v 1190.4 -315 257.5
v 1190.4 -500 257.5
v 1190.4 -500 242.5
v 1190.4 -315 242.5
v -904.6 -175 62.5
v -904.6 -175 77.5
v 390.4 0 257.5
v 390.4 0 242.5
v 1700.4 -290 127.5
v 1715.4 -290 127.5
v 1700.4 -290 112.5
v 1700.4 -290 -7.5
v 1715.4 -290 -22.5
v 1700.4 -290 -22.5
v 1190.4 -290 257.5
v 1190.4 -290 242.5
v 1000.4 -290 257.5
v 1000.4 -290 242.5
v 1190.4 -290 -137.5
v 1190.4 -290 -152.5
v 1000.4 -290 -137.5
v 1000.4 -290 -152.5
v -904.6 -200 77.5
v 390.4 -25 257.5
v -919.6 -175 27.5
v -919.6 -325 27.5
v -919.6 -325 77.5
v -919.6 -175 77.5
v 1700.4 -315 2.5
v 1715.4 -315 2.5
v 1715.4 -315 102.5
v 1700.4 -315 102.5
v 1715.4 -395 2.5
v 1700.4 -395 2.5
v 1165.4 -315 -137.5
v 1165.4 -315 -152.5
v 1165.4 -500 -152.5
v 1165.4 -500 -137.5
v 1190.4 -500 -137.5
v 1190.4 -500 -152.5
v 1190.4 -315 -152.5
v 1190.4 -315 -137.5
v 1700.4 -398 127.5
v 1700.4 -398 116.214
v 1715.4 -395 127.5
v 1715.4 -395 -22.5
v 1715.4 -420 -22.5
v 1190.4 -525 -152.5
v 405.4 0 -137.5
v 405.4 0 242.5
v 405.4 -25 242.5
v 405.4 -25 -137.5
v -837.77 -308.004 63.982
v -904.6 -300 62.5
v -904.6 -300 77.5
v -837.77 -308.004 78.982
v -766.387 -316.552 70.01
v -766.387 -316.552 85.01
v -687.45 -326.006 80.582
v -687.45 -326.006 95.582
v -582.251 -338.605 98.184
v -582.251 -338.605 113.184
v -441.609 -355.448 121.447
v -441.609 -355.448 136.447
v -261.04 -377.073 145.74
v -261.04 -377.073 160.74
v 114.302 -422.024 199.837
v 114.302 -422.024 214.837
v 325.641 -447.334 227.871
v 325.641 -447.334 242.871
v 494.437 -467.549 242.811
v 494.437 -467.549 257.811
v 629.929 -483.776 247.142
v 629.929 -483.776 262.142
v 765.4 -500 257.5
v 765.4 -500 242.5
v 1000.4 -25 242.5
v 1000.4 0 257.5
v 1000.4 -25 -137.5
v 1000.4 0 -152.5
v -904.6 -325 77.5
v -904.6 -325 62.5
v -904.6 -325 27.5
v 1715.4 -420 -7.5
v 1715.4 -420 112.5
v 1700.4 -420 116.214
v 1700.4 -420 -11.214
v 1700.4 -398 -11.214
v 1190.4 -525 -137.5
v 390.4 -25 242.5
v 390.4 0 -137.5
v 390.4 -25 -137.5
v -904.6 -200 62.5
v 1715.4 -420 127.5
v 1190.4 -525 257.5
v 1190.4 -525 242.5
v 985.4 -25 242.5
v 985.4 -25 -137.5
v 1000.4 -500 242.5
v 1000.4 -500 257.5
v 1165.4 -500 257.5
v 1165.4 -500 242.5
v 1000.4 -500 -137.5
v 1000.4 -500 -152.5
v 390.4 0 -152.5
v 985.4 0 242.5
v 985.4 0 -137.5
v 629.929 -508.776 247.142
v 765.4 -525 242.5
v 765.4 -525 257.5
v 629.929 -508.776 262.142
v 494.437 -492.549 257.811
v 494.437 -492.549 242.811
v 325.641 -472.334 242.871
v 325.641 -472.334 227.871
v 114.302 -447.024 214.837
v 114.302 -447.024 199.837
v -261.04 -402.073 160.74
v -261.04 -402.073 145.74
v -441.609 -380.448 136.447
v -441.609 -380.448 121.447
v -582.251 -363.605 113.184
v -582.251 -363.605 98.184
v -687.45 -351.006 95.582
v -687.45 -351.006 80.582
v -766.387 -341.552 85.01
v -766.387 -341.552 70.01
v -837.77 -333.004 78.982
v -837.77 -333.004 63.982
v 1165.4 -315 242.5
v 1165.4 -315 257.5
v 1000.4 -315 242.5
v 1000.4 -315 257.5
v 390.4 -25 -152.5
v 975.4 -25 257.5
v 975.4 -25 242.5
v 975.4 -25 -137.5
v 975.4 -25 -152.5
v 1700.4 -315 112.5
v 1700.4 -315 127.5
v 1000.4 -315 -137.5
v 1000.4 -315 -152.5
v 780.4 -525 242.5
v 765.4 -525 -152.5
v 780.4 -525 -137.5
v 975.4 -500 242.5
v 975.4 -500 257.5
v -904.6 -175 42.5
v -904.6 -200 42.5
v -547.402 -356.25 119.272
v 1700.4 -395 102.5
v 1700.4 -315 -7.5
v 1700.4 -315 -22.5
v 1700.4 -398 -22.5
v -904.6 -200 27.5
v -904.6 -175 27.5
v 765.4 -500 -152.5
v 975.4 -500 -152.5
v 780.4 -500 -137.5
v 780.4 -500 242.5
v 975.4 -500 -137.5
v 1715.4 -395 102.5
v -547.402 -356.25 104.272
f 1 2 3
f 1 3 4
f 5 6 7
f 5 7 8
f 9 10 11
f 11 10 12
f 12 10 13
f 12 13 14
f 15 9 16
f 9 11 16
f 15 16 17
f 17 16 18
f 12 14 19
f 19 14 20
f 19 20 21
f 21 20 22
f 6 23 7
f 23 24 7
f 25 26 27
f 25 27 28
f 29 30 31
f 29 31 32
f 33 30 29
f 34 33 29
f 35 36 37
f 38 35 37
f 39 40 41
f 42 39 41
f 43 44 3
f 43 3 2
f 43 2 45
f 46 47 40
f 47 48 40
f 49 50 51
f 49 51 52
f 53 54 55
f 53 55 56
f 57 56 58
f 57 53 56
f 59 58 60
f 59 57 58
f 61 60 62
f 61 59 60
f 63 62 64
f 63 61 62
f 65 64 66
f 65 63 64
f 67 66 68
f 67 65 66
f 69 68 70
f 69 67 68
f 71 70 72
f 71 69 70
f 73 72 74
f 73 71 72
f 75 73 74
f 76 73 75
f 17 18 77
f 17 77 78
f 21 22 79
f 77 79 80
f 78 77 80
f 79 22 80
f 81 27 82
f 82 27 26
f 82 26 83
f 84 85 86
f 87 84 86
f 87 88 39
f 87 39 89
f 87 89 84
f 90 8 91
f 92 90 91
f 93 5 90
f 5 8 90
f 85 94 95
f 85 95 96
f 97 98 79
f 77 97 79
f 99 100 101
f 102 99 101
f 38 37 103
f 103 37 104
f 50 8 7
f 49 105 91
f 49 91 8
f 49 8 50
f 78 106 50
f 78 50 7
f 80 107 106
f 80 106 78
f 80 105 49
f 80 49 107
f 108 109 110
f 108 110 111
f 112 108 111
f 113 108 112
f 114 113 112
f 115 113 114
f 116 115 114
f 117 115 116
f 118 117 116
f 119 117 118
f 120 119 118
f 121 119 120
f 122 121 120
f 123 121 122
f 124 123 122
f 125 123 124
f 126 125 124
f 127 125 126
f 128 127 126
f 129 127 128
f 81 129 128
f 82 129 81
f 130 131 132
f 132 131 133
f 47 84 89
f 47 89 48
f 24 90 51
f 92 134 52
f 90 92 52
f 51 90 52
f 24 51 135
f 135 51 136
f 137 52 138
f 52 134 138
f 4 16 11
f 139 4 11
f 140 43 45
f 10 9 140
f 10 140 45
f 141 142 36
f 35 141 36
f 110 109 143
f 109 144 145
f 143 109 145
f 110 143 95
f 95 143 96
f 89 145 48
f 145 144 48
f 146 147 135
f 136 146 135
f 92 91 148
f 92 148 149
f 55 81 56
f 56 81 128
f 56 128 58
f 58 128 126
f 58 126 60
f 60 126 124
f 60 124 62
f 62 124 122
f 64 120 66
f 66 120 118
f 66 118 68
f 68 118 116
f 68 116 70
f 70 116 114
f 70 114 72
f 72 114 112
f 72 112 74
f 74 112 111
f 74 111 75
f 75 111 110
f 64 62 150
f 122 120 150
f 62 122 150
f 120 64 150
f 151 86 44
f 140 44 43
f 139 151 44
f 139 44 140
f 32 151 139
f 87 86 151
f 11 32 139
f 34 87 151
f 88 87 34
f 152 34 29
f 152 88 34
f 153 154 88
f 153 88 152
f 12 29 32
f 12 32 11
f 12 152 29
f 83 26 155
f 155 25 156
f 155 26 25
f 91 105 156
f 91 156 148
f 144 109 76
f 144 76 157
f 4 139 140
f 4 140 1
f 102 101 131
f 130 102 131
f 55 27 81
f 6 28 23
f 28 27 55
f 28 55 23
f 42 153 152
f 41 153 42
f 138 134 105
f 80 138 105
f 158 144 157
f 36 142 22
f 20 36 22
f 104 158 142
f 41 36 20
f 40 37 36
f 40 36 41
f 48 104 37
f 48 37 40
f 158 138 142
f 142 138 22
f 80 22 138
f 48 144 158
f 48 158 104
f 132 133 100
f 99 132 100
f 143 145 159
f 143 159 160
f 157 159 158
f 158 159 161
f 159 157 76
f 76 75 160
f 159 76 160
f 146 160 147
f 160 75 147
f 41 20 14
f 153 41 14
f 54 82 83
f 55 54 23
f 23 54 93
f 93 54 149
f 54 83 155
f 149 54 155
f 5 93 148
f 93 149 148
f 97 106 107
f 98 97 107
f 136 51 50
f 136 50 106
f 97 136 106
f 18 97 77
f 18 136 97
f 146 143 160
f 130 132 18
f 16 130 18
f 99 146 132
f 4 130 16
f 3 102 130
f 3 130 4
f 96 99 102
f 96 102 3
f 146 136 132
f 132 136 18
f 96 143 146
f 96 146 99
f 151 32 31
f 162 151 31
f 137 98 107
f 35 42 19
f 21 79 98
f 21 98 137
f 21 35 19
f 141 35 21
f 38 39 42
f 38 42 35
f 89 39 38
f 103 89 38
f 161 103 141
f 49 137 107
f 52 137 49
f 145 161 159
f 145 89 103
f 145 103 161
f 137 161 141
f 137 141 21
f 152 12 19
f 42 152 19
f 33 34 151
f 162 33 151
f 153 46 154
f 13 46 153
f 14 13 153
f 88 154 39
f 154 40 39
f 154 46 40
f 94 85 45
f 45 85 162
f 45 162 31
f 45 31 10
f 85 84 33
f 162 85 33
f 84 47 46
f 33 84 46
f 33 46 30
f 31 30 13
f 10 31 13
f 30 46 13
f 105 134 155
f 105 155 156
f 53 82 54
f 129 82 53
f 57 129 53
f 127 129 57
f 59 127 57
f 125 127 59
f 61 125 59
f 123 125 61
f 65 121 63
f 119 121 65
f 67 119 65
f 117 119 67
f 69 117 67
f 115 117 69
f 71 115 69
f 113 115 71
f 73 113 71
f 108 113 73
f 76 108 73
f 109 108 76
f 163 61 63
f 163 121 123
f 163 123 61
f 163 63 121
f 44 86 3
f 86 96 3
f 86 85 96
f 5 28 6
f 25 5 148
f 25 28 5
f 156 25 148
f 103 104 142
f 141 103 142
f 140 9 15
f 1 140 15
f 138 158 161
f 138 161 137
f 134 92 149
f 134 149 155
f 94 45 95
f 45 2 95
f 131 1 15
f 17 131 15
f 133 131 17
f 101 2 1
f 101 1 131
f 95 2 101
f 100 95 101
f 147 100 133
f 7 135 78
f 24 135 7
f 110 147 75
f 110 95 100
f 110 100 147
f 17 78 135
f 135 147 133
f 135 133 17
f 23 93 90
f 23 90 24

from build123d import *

# Parameters (mm, degrees)
SKETCH1_W                 = 610
SKETCH1_H                 = 410
SKETCH1_W_2               = 580
SKETCH1_H_2               = 380
BOSS_EXTRUDE1_DEPTH       = 25
BOSS_EXTRUDE2_DEPTH       = 15
BOSS_EXTRUDE6_DEPTH       = 15
BOSS_EXTRUDE11_DEPTH      = 25
SKETCH8_W                 = 15
SKETCH8_H                 = 130
BOSS_EXTRUDE12_DEPTH      = 25
SKETCH9_W                 = 15
SKETCH9_H                 = 130
BOSS_EXTRUDE13_DEPTH      = 25
SKETCH10_W                = 150
SKETCH10_H                = 25
BOSS_EXTRUDE14_DEPTH      = 15
SKETCH13_W                = 215
SKETCH13_H                = 25
BOSS_EXTRUDE15_DEPTH      = 15
SKETCH14_W                = 215
SKETCH14_H                = 25
BOSS_EXTRUDE16_DEPTH      = 15
BOSS_EXTRUDE17_DEPTH      = 25
BOSS_EXTRUDE17_DEPTH_BACK = 25
BOSS_EXTRUDE17_START      = -205
SKETCH17_W                = 15
SKETCH17_H                = 150
BOSS_EXTRUDE18_DEPTH      = 25
LOFT13_START              = -525.0000001
LOFT13_DEPTH              = 225.0000002
LOFT13_START_2            = -152.5000001
LOFT13_2_DEPTH            = 415.5000001


with BuildPart() as part:
    # Sketch1 → Boss-Extrude1 (new body)
    with BuildSketch(Plane(origin=(0, 0, 0), x_dir=(1, 0, 0), z_dir=(0, 1, 0))):
        with Locations((695.4, -52.5)):
            Rectangle(SKETCH1_W, SKETCH1_H)
        with Locations((695.4, -52.5)):
            Rectangle(SKETCH1_W_2, SKETCH1_H_2, mode=Mode.SUBTRACT)
    extrude(amount=-BOSS_EXTRUDE1_DEPTH)

    # Sketch2 → Boss-Extrude2 (add)
    with BuildSketch(Plane.XY.offset(257.5)):
        Polygon((1000.4, 0), (1000.4, -290), (1190.4, -290), (1190.4, -500), (1165.4, -500), (1165.4, -315), (1000.4, -315), (1000.4, -500), (975.4, -500), (975.4, 0), align=None)
    extrude(amount=-BOSS_EXTRUDE2_DEPTH)

    # Sketch4 → Boss-Extrude6 (add)
    with BuildSketch(Plane(origin=(0, 0, -152.5), x_dir=(-1, 0, 0), z_dir=(0, 0, -1))):
        Polygon((-1000.4, -500), (-1000.4, -315), (-1165.4, -315), (-1165.4, -500), (-1190.4, -500), (-1190.4, -290), (-1000.4, -290), (-1000.4, 0), (-975.4, 0), (-975.4, -500), align=None)
    extrude(amount=-BOSS_EXTRUDE6_DEPTH)

    # Sketch6 → Boss-Extrude11 (add)
    with BuildSketch(Plane(origin=(0, -290, 0), x_dir=(1, 0, 0), z_dir=(0, 1, 0))):
        Polygon((1700.4, 22.5), (1715.4, 22.5), (1715.4, -52.5), (1715.4, -127.5), (1700.4, -127.5), (1190.4, -257.5), (1190.4, -242.5), (1700.4, -112.5), (1700.4, 7.5), (1190.4, 137.5), (1190.4, 152.5), align=None)
    extrude(amount=-BOSS_EXTRUDE11_DEPTH)

    # Sketch8 → Boss-Extrude12 (add)
    with BuildSketch(Plane.XY.offset(127.5)):
        with Locations((1707.9, -355)):
            Rectangle(SKETCH8_W, SKETCH8_H)
    extrude(amount=-BOSS_EXTRUDE12_DEPTH)

    # Sketch9 → Boss-Extrude13 (add)
    with BuildSketch(Plane(origin=(0, 0, -22.5), x_dir=(-1, 0, 0), z_dir=(0, 0, -1))):
        with Locations((-1707.9, -355)):
            Rectangle(SKETCH9_W, SKETCH9_H)
    extrude(amount=-BOSS_EXTRUDE13_DEPTH)

    # Sketch10 → Boss-Extrude14 (add)
    with BuildSketch(Plane.ZY.offset(-1700.4)):
        with Locations((52.5, -407.5)):
            Rectangle(SKETCH10_W, SKETCH10_H)
    extrude(amount=-BOSS_EXTRUDE14_DEPTH)

    # Sketch13 → Boss-Extrude15 (add)
    with BuildSketch(Plane(origin=(0, 0, -152.5), x_dir=(-1, 0, 0), z_dir=(0, 0, -1))):
        with Locations((-1082.9, -512.5)):
            Rectangle(SKETCH13_W, SKETCH13_H)
    extrude(amount=-BOSS_EXTRUDE15_DEPTH)

    # Sketch14 → Boss-Extrude16 (add)
    with BuildSketch(Plane.XY.offset(257.5)):
        with Locations((1082.9, -512.5)):
            Rectangle(SKETCH14_W, SKETCH14_H)
    extrude(amount=-BOSS_EXTRUDE16_DEPTH)

    # Sketch12 → Loft2 section 0
    with BuildSketch(Plane(origin=(1715.4, 0, 0), x_dir=(0, 0, -1), z_dir=(1, 0, 0))):
        with BuildLine():
            Line((22.5, -420), (22.5, -395))
            Line((22.5, -395), (7.5, -395))
            Line((7.5, -395), (7.5, -420))
            Line((7.5, -420), (22.5, -420))
        make_face()
    # Sketch15 → Loft2 section 1
    with BuildSketch(Plane(origin=(1190.4, 0, 0), x_dir=(0, 0, -1), z_dir=(1, 0, 0))):
        with BuildLine():
            Line((152.5, -525), (137.5, -525))
            Line((137.5, -525), (137.5, -500))
            Line((137.5, -500), (152.5, -500))
            Line((152.5, -500), (152.5, -525))
        make_face()
    loft()

    # Sketch18 → Loft3 section 0
    with BuildSketch(Plane(origin=(1715.4, 0, 0), x_dir=(0, 0, -1), z_dir=(1, 0, 0))):
        with BuildLine():
            Line((-127.5, -420), (-112.5, -420))
            Line((-112.5, -420), (-112.5, -395))
            Line((-112.5, -395), (-127.5, -395))
            Line((-127.5, -395), (-127.5, -420))
        make_face()
    # Sketch19 → Loft3 section 1
    with BuildSketch(Plane(origin=(1190.4, 0, 0), x_dir=(0, 0, -1), z_dir=(1, 0, 0))):
        with BuildLine():
            Line((-257.5, -525), (-242.5, -525))
            Line((-242.5, -525), (-242.5, -500))
            Line((-242.5, -500), (-257.5, -500))
            Line((-257.5, -500), (-257.5, -525))
        make_face()
    loft()



with BuildPart() as body_2:
    # Sketch17 → Boss-Extrude17 (new, two sides: drawn at the far end of the back side and taken through both)
    with BuildSketch(Plane.XY.offset(257.5).offset(BOSS_EXTRUDE17_START - BOSS_EXTRUDE17_DEPTH_BACK)):
        with Locations((-912.1, -250)):
            Rectangle(SKETCH17_W, SKETCH17_H)
    extrude(amount=BOSS_EXTRUDE17_DEPTH + BOSS_EXTRUDE17_DEPTH_BACK)


with BuildPart() as part_1:
    add(part.part)

    add(body_2.part)  # Loft6 merges body 2
    # Sketch21 → Loft6 section 0
    with BuildSketch(Plane(origin=(-904.6, 0, 0), x_dir=(0, 0, -1), z_dir=(1, 0, 0))):
        with BuildLine():
            Line((-77.5, -175), (-62.5, -175))
            Line((-62.5, -175), (-62.5, -200))
            Line((-62.5, -200), (-77.5, -200))
            Line((-77.5, -200), (-77.5, -175))
        make_face()
    # Sketch20 → Loft6 section 1
    with BuildSketch(Plane.ZY.offset(-390.4)):
        with BuildLine():
            Line((257.5, 0), (257.5, -25))
            Line((257.5, -25), (242.5, -25))
            Line((242.5, -25), (242.5, 0))
            Line((242.5, 0), (257.5, 0))
        make_face()
    loft()

    # Sketch23 → Loft7 section 0
    with BuildSketch(Plane.ZY.offset(-390.4)):
        with BuildLine():
            Line((-152.5, 0), (-137.5, 0))
            Line((-137.5, 0), (-137.5, -25))
            Line((-137.5, -25), (-152.5, -25))
            Line((-152.5, -25), (-152.5, 0))
        make_face()
    # Sketch22 → Loft7 section 1
    with BuildSketch(Plane(origin=(-904.6, 0, 0), x_dir=(0, 0, -1), z_dir=(1, 0, 0))):
        with BuildLine():
            Line((-27.5, -175), (-27.5, -200))
            Line((-27.5, -200), (-42.5, -200))
            Line((-42.5, -200), (-42.5, -175))
            Line((-42.5, -175), (-27.5, -175))
        make_face()
    loft()

    # Sketch24 → Boss-Extrude18 (add)
    with BuildSketch(Plane.XZ.offset(525)):
        Polygon((975.4, 257.5), (765.4, 257.5), (765.4, -152.5), (975.4, -152.5), (975.4, -137.5), (780.4, -137.5), (780.4, 242.5), (975.4, 242.5), align=None)
    extrude(amount=-BOSS_EXTRUDE18_DEPTH)

    # Loft13: read off the stored shape, not the designer's step
    # Loft13 outline → Loft13 (add)
    with BuildSketch(Plane(origin=(0, 0, 0), x_dir=(1, 0, 0), z_dir=(0, 1, 0)).offset(LOFT13_START)):
        with BuildLine():
            Line((-904.6, -62.5), (-904.6, -77.5))
            add(Edge.make_bspline(
                [(-904.6, -77.5), (-764.041130949, -75.679060612), (-527.584659858, -129.428121998), (-157.569765668, -171.662088503), (257.177772802, -240.107254931), (577.127812515, -271.097379608), (765.4, -257.5)],
                knots=[0, 0, 0, 0, 0.250527251, 0.428009069, 0.664938737, 1, 1, 1, 1], degree=3))
            Line((765.4, -257.5), (765.4, -242.5))
            add(Edge.make_bspline(
                [(-904.6, -62.5), (-764.041130949, -60.679060612), (-527.584659858, -114.428121998), (-157.569765668, -156.662088503), (257.177772802, -225.107254931), (577.127812515, -256.097379608), (765.4, -242.5)],
                knots=[0, 0, 0, 0, 0.250527251, 0.428009069, 0.664938737, 1, 1, 1, 1], degree=3))
        make_face()
    extrude(amount=LOFT13_DEPTH)

    # Loft13 2 outline → Loft13 2 (cut)
    with BuildSketch(Plane.XY.offset(LOFT13_START_2)):
        Polygon((-904.6, -300), (765.4, -500), (765.4, -299.9999999), align=None)
        Polygon((765.4, -525), (-904.6, -325), (-904.6, -525.0000001), align=None)
    extrude(amount=LOFT13_2_DEPTH, mode=Mode.SUBTRACT)


solid = part_1.part
